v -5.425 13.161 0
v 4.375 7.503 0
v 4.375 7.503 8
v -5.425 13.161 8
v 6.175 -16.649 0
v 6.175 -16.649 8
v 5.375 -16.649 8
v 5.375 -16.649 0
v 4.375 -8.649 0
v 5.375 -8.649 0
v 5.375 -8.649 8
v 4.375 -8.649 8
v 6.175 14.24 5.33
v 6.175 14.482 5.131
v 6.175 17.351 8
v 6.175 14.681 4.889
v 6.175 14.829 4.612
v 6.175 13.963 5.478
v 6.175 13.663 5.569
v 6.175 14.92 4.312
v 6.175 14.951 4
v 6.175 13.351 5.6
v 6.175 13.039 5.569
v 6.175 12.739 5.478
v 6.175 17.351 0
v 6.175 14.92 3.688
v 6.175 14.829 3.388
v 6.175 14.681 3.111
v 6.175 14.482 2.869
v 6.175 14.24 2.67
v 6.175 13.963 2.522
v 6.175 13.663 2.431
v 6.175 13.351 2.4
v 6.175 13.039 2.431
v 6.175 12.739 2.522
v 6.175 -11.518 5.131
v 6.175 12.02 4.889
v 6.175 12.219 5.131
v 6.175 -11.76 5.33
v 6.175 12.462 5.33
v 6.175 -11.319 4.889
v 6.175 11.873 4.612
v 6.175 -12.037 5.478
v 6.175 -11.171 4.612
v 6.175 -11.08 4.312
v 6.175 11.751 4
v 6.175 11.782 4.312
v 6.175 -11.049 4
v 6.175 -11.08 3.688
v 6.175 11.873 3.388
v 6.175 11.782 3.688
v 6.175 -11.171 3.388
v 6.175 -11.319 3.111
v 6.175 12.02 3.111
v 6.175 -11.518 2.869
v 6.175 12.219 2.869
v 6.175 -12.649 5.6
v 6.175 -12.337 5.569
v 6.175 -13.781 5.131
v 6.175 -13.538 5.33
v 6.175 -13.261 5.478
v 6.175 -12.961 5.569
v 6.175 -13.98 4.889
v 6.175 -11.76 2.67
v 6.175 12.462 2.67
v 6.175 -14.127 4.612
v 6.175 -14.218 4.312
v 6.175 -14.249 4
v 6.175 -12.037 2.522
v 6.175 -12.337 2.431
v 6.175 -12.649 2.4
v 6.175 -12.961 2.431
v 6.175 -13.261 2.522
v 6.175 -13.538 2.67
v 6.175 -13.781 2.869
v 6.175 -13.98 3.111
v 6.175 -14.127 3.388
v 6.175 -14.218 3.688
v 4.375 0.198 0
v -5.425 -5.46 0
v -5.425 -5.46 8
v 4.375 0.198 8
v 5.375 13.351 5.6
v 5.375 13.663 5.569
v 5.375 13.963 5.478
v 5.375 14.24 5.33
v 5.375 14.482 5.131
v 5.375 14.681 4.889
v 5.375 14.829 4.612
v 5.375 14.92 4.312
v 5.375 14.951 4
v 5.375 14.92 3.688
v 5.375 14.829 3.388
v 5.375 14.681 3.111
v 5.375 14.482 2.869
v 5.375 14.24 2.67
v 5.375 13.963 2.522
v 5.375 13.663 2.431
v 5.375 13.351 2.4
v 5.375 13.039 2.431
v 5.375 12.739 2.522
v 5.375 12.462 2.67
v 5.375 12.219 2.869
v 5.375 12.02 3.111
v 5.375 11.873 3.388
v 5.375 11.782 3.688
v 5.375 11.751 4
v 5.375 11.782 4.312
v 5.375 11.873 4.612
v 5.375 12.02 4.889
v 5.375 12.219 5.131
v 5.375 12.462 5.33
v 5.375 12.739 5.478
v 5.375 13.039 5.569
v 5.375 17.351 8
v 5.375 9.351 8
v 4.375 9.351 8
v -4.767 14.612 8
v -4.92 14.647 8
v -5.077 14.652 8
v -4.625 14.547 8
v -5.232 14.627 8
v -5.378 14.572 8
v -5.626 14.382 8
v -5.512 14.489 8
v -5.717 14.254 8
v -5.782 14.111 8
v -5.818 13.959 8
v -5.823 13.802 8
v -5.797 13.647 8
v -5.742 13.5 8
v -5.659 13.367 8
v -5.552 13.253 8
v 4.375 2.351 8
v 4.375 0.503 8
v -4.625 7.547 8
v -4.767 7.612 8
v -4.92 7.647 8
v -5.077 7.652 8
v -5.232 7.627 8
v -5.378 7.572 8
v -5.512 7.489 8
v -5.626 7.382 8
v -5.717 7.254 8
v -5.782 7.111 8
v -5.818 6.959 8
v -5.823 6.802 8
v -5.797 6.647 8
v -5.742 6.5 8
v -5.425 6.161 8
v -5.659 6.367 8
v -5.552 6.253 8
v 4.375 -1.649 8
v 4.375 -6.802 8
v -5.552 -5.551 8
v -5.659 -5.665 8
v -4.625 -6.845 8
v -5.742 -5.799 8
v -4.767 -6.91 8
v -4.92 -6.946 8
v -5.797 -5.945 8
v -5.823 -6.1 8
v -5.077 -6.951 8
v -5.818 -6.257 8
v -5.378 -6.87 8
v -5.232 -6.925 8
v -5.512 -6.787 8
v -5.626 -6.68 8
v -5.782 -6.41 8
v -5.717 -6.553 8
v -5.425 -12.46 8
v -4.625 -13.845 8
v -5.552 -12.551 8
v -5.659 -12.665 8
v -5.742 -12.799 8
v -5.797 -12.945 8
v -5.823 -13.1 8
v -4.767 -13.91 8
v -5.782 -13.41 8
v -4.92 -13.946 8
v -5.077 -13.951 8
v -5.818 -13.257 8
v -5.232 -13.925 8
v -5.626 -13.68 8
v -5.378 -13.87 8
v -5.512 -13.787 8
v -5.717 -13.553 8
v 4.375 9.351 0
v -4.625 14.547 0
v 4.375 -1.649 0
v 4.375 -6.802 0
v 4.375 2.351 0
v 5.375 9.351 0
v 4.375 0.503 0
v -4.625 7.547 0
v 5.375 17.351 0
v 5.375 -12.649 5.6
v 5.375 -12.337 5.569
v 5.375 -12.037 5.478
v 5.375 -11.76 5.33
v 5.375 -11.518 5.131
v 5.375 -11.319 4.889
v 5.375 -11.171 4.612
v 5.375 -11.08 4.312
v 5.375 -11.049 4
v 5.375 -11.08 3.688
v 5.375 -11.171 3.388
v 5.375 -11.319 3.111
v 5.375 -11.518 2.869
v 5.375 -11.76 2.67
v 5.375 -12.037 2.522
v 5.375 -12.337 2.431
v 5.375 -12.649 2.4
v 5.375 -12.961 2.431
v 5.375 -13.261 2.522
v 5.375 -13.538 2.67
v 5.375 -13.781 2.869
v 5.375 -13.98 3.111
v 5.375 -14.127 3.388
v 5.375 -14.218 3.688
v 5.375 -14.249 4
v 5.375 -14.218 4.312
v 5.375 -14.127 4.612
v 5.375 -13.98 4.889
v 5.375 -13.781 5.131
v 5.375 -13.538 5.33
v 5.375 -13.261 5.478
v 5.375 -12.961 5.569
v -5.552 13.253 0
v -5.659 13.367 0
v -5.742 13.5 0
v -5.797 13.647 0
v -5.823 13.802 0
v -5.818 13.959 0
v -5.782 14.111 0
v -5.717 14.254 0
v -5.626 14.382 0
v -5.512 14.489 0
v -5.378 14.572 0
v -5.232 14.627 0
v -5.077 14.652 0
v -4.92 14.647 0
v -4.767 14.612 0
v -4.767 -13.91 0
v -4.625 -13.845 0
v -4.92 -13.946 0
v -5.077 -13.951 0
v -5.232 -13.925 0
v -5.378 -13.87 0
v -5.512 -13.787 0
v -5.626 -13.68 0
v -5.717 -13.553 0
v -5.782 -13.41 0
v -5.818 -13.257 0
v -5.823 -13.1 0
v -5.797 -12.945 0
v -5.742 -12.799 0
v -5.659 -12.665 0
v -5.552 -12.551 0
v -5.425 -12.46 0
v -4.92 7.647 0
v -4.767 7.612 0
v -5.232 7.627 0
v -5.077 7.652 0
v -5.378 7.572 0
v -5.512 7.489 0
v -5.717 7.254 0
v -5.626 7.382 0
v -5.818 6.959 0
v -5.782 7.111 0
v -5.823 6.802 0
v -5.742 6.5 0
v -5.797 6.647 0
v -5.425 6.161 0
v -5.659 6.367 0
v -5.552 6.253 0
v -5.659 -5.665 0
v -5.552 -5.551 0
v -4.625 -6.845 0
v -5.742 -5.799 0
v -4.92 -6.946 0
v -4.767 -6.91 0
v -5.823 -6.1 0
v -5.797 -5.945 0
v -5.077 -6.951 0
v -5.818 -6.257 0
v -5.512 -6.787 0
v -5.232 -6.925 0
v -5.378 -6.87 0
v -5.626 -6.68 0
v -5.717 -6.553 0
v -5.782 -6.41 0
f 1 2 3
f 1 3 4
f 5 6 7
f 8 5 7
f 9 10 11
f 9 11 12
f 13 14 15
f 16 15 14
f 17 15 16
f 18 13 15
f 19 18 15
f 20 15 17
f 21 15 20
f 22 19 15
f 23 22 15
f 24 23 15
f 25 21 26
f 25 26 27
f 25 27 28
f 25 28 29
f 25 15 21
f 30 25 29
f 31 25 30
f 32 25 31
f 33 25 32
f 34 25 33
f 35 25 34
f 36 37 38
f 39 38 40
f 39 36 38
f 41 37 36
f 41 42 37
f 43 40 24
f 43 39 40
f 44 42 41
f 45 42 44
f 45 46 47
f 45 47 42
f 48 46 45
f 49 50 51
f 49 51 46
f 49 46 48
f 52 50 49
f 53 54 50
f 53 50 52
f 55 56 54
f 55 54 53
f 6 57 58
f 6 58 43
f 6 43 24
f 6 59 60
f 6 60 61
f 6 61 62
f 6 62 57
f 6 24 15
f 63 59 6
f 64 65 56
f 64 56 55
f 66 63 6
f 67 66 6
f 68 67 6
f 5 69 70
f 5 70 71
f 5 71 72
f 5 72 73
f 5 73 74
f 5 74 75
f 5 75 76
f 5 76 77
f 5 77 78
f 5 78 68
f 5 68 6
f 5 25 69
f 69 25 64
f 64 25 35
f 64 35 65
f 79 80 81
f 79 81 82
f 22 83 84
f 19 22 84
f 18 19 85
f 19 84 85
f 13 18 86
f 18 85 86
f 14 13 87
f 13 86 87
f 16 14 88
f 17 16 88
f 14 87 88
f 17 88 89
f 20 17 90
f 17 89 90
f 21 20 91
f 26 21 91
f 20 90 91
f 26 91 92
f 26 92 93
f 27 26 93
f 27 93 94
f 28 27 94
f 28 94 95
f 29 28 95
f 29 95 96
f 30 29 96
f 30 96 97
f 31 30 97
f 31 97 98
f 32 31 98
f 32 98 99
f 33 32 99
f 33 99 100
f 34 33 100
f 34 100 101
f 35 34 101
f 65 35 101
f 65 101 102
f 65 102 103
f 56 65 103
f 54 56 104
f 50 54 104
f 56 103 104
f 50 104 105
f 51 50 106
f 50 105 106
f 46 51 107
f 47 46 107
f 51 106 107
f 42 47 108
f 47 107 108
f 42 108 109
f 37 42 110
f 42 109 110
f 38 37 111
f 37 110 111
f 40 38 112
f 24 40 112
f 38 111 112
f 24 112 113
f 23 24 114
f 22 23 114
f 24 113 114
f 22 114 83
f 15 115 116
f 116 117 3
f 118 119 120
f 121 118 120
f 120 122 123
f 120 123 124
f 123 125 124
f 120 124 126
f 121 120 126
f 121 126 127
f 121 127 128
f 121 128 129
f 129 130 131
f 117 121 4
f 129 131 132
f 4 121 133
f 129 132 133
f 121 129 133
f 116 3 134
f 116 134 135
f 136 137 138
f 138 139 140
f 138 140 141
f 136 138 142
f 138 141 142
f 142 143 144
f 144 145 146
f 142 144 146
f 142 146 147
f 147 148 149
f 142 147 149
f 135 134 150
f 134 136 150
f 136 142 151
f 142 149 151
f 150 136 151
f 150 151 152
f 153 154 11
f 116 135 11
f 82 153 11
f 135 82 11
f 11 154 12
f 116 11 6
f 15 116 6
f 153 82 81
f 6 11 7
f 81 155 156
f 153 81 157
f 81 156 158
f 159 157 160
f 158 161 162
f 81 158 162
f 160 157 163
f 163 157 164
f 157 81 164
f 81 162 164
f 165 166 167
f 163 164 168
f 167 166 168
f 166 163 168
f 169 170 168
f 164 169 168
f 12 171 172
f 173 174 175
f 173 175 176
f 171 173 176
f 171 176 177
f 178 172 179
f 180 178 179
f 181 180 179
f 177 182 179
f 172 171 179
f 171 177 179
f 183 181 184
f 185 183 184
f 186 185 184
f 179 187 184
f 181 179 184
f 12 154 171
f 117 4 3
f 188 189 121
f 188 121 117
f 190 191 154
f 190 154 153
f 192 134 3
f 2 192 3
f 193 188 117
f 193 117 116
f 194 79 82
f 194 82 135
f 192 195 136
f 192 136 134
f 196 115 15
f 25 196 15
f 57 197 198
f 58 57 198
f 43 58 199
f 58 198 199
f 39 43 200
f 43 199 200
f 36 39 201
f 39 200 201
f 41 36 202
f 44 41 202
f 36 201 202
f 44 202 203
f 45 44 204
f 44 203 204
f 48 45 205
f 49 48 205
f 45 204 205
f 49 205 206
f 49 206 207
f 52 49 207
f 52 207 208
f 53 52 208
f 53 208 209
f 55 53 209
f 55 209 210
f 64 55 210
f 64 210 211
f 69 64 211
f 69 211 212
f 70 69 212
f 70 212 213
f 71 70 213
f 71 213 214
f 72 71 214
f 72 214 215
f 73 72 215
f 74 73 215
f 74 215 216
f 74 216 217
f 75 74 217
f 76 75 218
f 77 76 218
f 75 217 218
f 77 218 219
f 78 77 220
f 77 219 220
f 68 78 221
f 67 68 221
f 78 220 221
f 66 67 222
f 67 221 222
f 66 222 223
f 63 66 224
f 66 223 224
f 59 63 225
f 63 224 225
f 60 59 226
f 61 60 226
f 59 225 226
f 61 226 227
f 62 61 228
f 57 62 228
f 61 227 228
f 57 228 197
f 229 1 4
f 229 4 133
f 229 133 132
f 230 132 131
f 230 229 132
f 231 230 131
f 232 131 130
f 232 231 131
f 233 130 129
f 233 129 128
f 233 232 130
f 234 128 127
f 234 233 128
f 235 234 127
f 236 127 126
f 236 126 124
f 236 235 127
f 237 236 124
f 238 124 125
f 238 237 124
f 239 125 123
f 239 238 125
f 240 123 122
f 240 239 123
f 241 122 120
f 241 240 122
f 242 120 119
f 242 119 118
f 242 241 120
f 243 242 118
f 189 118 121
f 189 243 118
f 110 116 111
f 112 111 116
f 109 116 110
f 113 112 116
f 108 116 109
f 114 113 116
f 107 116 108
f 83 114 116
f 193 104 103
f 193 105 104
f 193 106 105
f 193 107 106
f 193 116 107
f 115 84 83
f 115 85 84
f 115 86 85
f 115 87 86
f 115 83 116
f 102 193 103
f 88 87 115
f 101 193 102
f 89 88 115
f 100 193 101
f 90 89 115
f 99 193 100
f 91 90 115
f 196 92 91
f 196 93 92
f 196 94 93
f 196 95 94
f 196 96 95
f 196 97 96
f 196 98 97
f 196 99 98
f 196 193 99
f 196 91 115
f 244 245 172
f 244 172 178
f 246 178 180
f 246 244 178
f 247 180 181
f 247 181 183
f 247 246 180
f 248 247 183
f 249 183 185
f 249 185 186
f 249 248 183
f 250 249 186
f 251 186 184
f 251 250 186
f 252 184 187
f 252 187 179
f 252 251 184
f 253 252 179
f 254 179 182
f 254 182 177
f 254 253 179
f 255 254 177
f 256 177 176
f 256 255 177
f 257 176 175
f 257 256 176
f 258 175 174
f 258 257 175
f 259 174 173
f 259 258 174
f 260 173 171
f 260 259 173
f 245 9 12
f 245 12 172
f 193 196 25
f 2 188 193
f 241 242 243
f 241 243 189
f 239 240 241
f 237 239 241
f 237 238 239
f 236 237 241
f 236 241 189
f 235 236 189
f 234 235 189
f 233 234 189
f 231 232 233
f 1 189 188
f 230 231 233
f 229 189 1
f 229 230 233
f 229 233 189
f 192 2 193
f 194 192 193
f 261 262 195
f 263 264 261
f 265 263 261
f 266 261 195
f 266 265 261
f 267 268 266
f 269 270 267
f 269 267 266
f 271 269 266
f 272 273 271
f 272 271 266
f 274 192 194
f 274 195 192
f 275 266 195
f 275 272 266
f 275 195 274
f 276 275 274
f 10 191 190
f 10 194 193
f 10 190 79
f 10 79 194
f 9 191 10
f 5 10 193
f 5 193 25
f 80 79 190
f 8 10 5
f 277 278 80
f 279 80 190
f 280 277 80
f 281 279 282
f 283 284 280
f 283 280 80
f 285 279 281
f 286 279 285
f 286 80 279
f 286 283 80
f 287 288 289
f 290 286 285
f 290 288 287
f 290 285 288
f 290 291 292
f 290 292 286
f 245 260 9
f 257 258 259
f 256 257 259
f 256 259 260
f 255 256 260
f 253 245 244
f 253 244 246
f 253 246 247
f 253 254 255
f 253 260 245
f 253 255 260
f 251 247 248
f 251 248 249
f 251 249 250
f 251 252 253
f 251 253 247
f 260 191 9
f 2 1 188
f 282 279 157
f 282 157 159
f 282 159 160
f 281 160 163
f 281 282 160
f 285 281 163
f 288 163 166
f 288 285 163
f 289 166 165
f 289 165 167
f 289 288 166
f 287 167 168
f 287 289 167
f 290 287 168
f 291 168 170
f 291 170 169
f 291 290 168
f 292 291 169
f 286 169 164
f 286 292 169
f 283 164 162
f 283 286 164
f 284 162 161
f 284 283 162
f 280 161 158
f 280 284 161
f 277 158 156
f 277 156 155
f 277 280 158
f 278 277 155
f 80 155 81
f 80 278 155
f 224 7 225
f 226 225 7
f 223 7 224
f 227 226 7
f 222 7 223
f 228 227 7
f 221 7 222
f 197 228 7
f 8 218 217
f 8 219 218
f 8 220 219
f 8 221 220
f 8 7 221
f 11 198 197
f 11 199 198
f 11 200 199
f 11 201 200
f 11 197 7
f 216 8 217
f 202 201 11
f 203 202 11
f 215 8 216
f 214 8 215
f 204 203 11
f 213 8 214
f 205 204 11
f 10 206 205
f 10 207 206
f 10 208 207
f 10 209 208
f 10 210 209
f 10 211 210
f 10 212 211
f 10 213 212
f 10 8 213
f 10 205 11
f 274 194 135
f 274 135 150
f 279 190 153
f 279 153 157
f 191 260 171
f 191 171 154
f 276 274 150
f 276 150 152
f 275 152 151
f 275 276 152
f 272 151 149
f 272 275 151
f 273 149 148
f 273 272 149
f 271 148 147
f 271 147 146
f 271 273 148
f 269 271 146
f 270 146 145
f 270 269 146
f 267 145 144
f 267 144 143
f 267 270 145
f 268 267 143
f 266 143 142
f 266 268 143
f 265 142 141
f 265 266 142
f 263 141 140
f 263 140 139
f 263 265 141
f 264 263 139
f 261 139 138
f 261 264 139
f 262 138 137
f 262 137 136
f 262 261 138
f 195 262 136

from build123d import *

# Parameters (mm, degrees)
BOSS_EXTRUDE1_DEPTH = 8
SKETCH2_R           = 1.6
CUT_EXTRUDE1_DEPTH  = 9.5


with BuildPart() as part:
    # Sketch1 → Boss-Extrude1 (new body)
    with BuildSketch(Plane(origin=(0, 0, 0), x_dir=(0, 1, 0), z_dir=(0, 0, 1))):
        with BuildLine():
            Line((-16.649176641, -6.17541168), (-16.649176641, -5.37541168))
            Line((-16.649176641, -5.37541168), (-8.649176641, -5.37541168))
            Line((-8.649176641, -5.37541168), (-8.649176641, -4.37541168))
            Line((-8.649176641, -4.37541168), (-13.845329064, 4.62458832))
            ThreePointArc((-13.845329064, 4.62458832), (-13.552508741, 5.717408644), (-12.459688418, 5.42458832))
            Line((-12.459688418, 5.42458832), (-6.80165578, -4.37541168))
            Line((-6.80165578, -4.37541168), (-1.649176641, -4.37541168))
            Line((-1.649176641, -4.37541168), (-6.845329064, 4.62458832))
            ThreePointArc((-6.845329064, 4.62458832), (-6.552508741, 5.717408644), (-5.459688418, 5.42458832))
            Line((-5.459688418, 5.42458832), (0.19834422, -4.37541168))
            Line((0.19834422, -4.37541168), (0.503302498, -4.37541168))
            Line((0.503302498, -4.37541168), (6.161335136, 5.42458832))
            ThreePointArc((6.161335136, 5.42458832), (7.254155459, 5.717408644), (7.546975782, 4.62458832))
            Line((7.546975782, 4.62458832), (2.350823359, -4.37541168))
            Line((2.350823359, -4.37541168), (7.503302498, -4.37541168))
            Line((7.503302498, -4.37541168), (13.161335136, 5.42458832))
            ThreePointArc((13.161335136, 5.42458832), (14.254155459, 5.717408644), (14.546975782, 4.62458832))
            Line((14.546975782, 4.62458832), (9.350823359, -4.37541168))
            Line((9.350823359, -4.37541168), (9.350823359, -5.37541168))
            Line((9.350823359, -5.37541168), (17.350823359, -5.37541168))
            Line((17.350823359, -5.37541168), (17.350823359, -6.17541168))
            Line((17.350823359, -6.17541168), (-16.649176641, -6.17541168))
        make_face()
    extrude(amount=BOSS_EXTRUDE1_DEPTH)

    # Sketch2 → Cut-Extrude1 (cut)
    with BuildSketch(Plane(origin=(5.37541168, 0, 0), x_dir=(0, -1, 0), z_dir=(-1, 0, 0))):
        with Locations(Location((-13.350823359, 4, 0), (0, 0, 90))):
            Circle(SKETCH2_R)
        with Locations(Location((12.649176641, 4, 0), (0, 0, 90))):
            Circle(SKETCH2_R)
    extrude(amount=-CUT_EXTRUDE1_DEPTH, mode=Mode.SUBTRACT)


solid = part.part
